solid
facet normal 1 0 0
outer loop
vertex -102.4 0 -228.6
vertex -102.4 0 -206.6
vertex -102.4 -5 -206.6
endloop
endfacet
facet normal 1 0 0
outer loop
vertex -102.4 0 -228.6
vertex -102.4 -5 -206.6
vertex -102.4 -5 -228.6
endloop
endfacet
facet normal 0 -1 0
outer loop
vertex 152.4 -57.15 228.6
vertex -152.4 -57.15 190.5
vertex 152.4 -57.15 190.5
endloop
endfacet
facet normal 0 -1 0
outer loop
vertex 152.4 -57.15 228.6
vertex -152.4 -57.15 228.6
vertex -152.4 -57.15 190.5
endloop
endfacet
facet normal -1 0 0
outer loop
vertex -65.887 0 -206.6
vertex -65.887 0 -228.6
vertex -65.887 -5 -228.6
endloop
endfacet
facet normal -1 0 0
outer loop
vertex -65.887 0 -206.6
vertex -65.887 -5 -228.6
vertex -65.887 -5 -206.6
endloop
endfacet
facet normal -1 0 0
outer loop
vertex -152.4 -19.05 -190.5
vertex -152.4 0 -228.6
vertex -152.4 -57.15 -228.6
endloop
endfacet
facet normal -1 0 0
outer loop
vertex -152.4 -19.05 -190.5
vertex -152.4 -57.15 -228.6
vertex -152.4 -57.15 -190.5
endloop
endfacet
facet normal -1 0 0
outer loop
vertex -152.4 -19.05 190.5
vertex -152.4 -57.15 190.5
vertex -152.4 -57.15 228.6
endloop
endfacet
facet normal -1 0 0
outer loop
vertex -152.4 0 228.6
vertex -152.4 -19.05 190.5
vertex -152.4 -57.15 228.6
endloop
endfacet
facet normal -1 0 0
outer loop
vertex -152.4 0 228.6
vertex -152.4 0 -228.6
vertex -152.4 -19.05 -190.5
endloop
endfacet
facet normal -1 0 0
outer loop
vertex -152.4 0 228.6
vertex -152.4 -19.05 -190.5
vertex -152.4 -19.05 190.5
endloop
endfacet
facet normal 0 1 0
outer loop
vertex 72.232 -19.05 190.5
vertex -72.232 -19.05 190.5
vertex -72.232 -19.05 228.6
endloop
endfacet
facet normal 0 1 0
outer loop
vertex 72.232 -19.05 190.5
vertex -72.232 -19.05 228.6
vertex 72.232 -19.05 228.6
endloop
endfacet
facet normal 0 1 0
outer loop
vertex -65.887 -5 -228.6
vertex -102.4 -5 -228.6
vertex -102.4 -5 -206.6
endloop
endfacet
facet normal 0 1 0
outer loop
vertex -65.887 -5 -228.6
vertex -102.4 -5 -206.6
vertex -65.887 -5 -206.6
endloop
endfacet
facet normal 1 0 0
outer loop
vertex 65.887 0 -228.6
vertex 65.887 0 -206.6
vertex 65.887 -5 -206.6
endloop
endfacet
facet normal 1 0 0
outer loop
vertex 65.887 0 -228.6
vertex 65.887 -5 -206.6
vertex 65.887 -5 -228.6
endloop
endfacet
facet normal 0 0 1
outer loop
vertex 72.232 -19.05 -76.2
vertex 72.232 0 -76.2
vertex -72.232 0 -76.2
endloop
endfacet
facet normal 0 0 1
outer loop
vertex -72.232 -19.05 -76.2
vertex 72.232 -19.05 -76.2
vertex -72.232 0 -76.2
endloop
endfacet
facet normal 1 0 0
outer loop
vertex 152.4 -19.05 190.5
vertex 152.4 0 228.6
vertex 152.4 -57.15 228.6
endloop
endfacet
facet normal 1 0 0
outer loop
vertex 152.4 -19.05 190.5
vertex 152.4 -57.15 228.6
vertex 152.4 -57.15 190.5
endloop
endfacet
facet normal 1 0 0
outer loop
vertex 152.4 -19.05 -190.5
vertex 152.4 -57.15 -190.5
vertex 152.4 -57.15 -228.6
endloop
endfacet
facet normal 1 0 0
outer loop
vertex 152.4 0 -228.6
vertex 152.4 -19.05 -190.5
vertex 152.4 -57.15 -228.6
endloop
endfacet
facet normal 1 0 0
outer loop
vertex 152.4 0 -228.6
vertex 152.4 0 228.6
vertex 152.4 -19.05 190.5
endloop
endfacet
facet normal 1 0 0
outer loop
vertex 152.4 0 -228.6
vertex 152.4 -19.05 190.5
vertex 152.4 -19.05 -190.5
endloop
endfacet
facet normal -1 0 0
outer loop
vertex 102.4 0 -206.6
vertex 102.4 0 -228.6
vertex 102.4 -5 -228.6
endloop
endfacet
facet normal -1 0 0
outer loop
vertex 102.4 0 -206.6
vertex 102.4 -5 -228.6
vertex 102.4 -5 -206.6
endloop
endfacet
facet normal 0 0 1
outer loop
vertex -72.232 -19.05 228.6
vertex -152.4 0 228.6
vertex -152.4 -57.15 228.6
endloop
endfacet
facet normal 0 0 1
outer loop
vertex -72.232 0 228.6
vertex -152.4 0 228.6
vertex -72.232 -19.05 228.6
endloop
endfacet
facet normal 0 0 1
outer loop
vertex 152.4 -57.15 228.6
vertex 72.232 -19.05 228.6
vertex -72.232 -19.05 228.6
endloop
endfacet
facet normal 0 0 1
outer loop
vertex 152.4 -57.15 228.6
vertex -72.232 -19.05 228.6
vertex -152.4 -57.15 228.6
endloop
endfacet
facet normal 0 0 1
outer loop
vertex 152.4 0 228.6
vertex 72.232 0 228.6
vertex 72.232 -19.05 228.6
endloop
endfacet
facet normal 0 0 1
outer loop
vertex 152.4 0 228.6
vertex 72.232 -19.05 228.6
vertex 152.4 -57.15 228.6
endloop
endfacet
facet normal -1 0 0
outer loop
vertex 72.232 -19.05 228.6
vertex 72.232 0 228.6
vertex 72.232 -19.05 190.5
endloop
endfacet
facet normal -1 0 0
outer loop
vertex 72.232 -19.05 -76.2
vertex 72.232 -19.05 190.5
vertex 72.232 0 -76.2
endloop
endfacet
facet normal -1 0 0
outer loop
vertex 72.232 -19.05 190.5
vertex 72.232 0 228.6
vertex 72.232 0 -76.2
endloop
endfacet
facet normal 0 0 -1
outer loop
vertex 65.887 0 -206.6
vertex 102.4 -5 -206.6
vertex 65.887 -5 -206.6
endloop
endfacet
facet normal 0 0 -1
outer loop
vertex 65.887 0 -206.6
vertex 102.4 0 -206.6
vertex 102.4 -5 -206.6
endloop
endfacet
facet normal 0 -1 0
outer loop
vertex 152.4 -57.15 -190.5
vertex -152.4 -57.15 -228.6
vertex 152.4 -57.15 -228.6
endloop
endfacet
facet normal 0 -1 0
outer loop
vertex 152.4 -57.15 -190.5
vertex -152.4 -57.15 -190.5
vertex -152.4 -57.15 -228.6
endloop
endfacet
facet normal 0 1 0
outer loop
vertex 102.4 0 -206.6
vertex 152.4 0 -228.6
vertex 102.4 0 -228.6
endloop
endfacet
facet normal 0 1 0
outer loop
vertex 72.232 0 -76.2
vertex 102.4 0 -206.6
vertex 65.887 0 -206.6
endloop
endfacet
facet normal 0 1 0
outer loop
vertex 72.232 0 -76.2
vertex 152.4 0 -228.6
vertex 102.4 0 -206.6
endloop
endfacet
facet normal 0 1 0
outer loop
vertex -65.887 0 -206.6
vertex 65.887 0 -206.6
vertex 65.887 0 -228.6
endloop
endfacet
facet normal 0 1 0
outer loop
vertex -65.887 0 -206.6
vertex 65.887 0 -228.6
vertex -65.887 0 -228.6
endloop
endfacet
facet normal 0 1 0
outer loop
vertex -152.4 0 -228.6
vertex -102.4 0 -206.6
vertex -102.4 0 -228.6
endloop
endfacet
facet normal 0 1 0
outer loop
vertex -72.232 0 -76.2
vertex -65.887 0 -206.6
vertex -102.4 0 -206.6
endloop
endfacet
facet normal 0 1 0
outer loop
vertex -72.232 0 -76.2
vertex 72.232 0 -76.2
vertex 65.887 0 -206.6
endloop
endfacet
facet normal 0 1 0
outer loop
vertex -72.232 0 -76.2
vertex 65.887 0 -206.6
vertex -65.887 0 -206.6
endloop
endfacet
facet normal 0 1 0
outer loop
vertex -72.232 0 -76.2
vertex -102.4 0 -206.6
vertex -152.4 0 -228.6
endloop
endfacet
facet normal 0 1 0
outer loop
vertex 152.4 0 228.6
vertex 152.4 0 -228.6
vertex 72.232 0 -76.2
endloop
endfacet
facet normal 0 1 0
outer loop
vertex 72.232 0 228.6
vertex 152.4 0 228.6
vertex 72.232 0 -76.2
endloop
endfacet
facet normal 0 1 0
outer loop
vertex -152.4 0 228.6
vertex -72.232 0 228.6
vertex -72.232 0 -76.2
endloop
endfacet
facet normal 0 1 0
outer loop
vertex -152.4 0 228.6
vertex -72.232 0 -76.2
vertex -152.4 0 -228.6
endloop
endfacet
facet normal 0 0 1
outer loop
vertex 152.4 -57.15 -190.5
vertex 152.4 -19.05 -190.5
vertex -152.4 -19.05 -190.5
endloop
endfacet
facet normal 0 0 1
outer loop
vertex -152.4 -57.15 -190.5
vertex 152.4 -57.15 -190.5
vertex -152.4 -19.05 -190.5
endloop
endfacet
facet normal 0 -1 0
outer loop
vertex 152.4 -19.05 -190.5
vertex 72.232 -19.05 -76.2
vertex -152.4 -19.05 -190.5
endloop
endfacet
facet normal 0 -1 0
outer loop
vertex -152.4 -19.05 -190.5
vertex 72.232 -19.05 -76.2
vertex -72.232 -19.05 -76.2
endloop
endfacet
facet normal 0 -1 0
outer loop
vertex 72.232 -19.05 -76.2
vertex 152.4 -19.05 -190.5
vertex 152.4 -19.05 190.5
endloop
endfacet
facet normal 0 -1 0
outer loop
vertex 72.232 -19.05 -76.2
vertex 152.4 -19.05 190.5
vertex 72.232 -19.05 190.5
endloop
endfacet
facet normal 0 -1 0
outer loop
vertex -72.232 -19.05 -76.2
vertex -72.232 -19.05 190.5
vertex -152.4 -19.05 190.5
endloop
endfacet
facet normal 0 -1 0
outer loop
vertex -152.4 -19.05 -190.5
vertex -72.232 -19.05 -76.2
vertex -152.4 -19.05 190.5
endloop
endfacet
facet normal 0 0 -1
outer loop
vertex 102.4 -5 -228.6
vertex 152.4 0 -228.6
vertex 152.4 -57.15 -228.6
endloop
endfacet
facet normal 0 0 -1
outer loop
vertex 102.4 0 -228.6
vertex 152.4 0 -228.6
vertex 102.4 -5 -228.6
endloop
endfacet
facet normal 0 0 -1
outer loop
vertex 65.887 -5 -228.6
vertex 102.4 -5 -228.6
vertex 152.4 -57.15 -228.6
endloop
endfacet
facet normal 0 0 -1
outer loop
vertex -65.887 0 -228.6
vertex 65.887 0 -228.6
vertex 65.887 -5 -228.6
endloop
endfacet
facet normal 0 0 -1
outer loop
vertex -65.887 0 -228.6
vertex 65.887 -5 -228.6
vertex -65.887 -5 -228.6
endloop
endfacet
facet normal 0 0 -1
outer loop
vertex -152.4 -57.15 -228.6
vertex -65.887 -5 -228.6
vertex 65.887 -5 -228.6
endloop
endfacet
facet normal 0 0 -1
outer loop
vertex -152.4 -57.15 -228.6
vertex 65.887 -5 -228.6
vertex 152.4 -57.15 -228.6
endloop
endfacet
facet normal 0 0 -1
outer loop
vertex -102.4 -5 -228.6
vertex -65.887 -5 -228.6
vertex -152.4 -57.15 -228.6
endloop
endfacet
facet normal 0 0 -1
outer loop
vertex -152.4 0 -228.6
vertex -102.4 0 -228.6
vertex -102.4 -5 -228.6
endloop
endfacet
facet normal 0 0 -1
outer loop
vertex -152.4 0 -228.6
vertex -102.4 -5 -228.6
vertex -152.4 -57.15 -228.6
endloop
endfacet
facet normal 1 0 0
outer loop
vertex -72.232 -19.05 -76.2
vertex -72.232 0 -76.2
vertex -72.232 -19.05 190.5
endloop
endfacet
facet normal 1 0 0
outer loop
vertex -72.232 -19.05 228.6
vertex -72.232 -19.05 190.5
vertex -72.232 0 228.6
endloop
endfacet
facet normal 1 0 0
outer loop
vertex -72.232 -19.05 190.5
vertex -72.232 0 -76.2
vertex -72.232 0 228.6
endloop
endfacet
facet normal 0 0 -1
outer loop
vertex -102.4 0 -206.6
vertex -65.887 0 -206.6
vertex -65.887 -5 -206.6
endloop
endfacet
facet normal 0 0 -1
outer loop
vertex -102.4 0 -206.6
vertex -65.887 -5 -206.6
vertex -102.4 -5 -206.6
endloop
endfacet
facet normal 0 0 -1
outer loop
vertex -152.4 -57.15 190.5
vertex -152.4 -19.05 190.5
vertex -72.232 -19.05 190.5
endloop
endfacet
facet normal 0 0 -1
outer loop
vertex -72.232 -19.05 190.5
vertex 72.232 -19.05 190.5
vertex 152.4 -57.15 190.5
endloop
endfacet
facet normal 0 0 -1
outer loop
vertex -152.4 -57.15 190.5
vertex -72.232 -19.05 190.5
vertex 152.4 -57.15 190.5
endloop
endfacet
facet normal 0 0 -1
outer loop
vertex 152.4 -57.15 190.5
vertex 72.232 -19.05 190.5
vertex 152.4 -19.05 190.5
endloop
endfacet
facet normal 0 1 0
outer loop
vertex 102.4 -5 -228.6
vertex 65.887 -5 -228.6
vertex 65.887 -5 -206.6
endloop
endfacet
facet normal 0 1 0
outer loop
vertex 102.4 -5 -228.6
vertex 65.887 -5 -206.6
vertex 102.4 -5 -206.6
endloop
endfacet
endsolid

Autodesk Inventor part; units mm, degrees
ref_plane "YZ Plane" through (0, 0, 0) normal (1, 0, 0) x (0, 1, 0)
ref_plane "XZ Plane" through (0, 0, 0) normal (0, 1, 0) x (-1, 0, 0)
ref_plane "XY Plane" through (0, 0, 0) normal (0, 0, 1) x (1, 0, 0)
sketch "Sketch1" plane through (0, 0, 0) normal (0, 1, 0) x (-1, 0, 0)
  line L0 (-152.4, -228.6) -> (152.4, -228.6)
  line L1 (152.4, -228.6) -> (152.4, 228.6)
  line L2 (152.4, 228.6) -> (-152.4, 228.6)
  line L3 (-152.4, 228.6) -> (-152.4, -228.6)
  line L4 (-152.4, -228.6) -> (152.4, 228.6) construction
  line L5 (152.4, -228.6) -> (-152.4, 228.6) construction
  point P0 (0, 0)
  dimension "d0" = 457.2
  dimension "d1" = 304.8
extrude "Extrusion1" add sketch "Sketch1" against normal blind 19.05
sketch "Sketch3" plane through (0, -19.05, 0) normal (0, -1, 0) x (1, 0, 0)
  line L0 (152.4, -228.6) -> (152.4, 228.6) projected
  line L1 (-152.4, 228.6) -> (-152.4, -228.6) projected
  line L2 (152.4, 228.6) -> (-152.4, 228.6)
  line L3 (-152.4, 228.6) -> (-152.4, 190.5)
  line L4 (-152.4, 190.5) -> (152.4, 190.5)
  line L5 (152.4, 190.5) -> (152.4, 228.6)
  line L6 (-152.4, -228.6) -> (152.4, -228.6) projected
  line L7 (152.4, -190.5) -> (-152.4, -190.5)
  line L8 (-152.4, -190.5) -> (-152.4, -228.6)
  line L9 (-152.4, -228.6) -> (152.4, -228.6)
  line L10 (152.4, -228.6) -> (152.4, -190.5)
  point P0 (0, 0)
  dimension "d4" = 38.1
  dimension "d5" = 38.1
extrude "Extrusion2" add sketch "Sketch3" along normal blind 38.1 contours L6 L1 L7 L0 | L4 L1 L2 L0
sketch "Sketch4" plane through (0, 0, 0) normal (0, 1, 0) x (1, 0, 0)
  line L0 (-152.4, -228.6) -> (152.4, -228.6) projected
  line L1 (-72.2315, -228.6) -> (72.2315, -228.6)
  line L2 (72.2315, -228.6) -> (72.2315, 76.2)
  line L3 (72.2315, 76.2) -> (-72.2315, 76.2)
  line L4 (-72.2315, 76.2) -> (-72.2315, -228.6)
  line L5 (-152.4, 228.6) -> (-152.4, -228.6) projected
  point P0 (0, 0)
  dimension "d8" = 144.463
  dimension "d9" = 304.8
  dimension "d10" = 80.1685
extrude "Extrusion3" cut sketch "Sketch4" against normal blind 19.05
sketch "Sketch5" plane through (0, 0, 0) normal (0, 1, 0) x (1, 0, 0)
  line L0 (-102.4, 228.6) -> (-65.887, 228.6)
  line L1 (-65.887, 228.6) -> (-65.887, 206.6)
  line L2 (-65.887, 206.6) -> (-102.4, 206.6)
  line L3 (-102.4, 206.6) -> (-102.4, 228.6)
  line L4 (152.4, 228.6) -> (-152.4, 228.6) projected
  line L5 (65.887, 228.6) -> (102.4, 228.6)
  line L6 (102.4, 228.6) -> (102.4, 206.6)
  line L7 (102.4, 206.6) -> (65.887, 206.6)
  line L8 (65.887, 206.6) -> (65.887, 228.6)
  line L9 (-152.4, 228.6) -> (-152.4, -228.6) projected
  line L10 (152.4, -228.6) -> (152.4, 228.6) projected
  point P0 (0, 0)
  point P1 (-65.887, 217.6)
  point P2 (84.1435, 228.6)
  dimension "d13" = 0
  dimension "d14" = 36.513
  dimension "d15" = 22
  dimension "d16" = 36.513
  dimension "d17" = 22
  dimension "d18" = 50
  dimension "d19" = 50
extrude "Extrusion4" cut sketch "Sketch5" against normal blind 5
properties material "Wood (Maple)"
